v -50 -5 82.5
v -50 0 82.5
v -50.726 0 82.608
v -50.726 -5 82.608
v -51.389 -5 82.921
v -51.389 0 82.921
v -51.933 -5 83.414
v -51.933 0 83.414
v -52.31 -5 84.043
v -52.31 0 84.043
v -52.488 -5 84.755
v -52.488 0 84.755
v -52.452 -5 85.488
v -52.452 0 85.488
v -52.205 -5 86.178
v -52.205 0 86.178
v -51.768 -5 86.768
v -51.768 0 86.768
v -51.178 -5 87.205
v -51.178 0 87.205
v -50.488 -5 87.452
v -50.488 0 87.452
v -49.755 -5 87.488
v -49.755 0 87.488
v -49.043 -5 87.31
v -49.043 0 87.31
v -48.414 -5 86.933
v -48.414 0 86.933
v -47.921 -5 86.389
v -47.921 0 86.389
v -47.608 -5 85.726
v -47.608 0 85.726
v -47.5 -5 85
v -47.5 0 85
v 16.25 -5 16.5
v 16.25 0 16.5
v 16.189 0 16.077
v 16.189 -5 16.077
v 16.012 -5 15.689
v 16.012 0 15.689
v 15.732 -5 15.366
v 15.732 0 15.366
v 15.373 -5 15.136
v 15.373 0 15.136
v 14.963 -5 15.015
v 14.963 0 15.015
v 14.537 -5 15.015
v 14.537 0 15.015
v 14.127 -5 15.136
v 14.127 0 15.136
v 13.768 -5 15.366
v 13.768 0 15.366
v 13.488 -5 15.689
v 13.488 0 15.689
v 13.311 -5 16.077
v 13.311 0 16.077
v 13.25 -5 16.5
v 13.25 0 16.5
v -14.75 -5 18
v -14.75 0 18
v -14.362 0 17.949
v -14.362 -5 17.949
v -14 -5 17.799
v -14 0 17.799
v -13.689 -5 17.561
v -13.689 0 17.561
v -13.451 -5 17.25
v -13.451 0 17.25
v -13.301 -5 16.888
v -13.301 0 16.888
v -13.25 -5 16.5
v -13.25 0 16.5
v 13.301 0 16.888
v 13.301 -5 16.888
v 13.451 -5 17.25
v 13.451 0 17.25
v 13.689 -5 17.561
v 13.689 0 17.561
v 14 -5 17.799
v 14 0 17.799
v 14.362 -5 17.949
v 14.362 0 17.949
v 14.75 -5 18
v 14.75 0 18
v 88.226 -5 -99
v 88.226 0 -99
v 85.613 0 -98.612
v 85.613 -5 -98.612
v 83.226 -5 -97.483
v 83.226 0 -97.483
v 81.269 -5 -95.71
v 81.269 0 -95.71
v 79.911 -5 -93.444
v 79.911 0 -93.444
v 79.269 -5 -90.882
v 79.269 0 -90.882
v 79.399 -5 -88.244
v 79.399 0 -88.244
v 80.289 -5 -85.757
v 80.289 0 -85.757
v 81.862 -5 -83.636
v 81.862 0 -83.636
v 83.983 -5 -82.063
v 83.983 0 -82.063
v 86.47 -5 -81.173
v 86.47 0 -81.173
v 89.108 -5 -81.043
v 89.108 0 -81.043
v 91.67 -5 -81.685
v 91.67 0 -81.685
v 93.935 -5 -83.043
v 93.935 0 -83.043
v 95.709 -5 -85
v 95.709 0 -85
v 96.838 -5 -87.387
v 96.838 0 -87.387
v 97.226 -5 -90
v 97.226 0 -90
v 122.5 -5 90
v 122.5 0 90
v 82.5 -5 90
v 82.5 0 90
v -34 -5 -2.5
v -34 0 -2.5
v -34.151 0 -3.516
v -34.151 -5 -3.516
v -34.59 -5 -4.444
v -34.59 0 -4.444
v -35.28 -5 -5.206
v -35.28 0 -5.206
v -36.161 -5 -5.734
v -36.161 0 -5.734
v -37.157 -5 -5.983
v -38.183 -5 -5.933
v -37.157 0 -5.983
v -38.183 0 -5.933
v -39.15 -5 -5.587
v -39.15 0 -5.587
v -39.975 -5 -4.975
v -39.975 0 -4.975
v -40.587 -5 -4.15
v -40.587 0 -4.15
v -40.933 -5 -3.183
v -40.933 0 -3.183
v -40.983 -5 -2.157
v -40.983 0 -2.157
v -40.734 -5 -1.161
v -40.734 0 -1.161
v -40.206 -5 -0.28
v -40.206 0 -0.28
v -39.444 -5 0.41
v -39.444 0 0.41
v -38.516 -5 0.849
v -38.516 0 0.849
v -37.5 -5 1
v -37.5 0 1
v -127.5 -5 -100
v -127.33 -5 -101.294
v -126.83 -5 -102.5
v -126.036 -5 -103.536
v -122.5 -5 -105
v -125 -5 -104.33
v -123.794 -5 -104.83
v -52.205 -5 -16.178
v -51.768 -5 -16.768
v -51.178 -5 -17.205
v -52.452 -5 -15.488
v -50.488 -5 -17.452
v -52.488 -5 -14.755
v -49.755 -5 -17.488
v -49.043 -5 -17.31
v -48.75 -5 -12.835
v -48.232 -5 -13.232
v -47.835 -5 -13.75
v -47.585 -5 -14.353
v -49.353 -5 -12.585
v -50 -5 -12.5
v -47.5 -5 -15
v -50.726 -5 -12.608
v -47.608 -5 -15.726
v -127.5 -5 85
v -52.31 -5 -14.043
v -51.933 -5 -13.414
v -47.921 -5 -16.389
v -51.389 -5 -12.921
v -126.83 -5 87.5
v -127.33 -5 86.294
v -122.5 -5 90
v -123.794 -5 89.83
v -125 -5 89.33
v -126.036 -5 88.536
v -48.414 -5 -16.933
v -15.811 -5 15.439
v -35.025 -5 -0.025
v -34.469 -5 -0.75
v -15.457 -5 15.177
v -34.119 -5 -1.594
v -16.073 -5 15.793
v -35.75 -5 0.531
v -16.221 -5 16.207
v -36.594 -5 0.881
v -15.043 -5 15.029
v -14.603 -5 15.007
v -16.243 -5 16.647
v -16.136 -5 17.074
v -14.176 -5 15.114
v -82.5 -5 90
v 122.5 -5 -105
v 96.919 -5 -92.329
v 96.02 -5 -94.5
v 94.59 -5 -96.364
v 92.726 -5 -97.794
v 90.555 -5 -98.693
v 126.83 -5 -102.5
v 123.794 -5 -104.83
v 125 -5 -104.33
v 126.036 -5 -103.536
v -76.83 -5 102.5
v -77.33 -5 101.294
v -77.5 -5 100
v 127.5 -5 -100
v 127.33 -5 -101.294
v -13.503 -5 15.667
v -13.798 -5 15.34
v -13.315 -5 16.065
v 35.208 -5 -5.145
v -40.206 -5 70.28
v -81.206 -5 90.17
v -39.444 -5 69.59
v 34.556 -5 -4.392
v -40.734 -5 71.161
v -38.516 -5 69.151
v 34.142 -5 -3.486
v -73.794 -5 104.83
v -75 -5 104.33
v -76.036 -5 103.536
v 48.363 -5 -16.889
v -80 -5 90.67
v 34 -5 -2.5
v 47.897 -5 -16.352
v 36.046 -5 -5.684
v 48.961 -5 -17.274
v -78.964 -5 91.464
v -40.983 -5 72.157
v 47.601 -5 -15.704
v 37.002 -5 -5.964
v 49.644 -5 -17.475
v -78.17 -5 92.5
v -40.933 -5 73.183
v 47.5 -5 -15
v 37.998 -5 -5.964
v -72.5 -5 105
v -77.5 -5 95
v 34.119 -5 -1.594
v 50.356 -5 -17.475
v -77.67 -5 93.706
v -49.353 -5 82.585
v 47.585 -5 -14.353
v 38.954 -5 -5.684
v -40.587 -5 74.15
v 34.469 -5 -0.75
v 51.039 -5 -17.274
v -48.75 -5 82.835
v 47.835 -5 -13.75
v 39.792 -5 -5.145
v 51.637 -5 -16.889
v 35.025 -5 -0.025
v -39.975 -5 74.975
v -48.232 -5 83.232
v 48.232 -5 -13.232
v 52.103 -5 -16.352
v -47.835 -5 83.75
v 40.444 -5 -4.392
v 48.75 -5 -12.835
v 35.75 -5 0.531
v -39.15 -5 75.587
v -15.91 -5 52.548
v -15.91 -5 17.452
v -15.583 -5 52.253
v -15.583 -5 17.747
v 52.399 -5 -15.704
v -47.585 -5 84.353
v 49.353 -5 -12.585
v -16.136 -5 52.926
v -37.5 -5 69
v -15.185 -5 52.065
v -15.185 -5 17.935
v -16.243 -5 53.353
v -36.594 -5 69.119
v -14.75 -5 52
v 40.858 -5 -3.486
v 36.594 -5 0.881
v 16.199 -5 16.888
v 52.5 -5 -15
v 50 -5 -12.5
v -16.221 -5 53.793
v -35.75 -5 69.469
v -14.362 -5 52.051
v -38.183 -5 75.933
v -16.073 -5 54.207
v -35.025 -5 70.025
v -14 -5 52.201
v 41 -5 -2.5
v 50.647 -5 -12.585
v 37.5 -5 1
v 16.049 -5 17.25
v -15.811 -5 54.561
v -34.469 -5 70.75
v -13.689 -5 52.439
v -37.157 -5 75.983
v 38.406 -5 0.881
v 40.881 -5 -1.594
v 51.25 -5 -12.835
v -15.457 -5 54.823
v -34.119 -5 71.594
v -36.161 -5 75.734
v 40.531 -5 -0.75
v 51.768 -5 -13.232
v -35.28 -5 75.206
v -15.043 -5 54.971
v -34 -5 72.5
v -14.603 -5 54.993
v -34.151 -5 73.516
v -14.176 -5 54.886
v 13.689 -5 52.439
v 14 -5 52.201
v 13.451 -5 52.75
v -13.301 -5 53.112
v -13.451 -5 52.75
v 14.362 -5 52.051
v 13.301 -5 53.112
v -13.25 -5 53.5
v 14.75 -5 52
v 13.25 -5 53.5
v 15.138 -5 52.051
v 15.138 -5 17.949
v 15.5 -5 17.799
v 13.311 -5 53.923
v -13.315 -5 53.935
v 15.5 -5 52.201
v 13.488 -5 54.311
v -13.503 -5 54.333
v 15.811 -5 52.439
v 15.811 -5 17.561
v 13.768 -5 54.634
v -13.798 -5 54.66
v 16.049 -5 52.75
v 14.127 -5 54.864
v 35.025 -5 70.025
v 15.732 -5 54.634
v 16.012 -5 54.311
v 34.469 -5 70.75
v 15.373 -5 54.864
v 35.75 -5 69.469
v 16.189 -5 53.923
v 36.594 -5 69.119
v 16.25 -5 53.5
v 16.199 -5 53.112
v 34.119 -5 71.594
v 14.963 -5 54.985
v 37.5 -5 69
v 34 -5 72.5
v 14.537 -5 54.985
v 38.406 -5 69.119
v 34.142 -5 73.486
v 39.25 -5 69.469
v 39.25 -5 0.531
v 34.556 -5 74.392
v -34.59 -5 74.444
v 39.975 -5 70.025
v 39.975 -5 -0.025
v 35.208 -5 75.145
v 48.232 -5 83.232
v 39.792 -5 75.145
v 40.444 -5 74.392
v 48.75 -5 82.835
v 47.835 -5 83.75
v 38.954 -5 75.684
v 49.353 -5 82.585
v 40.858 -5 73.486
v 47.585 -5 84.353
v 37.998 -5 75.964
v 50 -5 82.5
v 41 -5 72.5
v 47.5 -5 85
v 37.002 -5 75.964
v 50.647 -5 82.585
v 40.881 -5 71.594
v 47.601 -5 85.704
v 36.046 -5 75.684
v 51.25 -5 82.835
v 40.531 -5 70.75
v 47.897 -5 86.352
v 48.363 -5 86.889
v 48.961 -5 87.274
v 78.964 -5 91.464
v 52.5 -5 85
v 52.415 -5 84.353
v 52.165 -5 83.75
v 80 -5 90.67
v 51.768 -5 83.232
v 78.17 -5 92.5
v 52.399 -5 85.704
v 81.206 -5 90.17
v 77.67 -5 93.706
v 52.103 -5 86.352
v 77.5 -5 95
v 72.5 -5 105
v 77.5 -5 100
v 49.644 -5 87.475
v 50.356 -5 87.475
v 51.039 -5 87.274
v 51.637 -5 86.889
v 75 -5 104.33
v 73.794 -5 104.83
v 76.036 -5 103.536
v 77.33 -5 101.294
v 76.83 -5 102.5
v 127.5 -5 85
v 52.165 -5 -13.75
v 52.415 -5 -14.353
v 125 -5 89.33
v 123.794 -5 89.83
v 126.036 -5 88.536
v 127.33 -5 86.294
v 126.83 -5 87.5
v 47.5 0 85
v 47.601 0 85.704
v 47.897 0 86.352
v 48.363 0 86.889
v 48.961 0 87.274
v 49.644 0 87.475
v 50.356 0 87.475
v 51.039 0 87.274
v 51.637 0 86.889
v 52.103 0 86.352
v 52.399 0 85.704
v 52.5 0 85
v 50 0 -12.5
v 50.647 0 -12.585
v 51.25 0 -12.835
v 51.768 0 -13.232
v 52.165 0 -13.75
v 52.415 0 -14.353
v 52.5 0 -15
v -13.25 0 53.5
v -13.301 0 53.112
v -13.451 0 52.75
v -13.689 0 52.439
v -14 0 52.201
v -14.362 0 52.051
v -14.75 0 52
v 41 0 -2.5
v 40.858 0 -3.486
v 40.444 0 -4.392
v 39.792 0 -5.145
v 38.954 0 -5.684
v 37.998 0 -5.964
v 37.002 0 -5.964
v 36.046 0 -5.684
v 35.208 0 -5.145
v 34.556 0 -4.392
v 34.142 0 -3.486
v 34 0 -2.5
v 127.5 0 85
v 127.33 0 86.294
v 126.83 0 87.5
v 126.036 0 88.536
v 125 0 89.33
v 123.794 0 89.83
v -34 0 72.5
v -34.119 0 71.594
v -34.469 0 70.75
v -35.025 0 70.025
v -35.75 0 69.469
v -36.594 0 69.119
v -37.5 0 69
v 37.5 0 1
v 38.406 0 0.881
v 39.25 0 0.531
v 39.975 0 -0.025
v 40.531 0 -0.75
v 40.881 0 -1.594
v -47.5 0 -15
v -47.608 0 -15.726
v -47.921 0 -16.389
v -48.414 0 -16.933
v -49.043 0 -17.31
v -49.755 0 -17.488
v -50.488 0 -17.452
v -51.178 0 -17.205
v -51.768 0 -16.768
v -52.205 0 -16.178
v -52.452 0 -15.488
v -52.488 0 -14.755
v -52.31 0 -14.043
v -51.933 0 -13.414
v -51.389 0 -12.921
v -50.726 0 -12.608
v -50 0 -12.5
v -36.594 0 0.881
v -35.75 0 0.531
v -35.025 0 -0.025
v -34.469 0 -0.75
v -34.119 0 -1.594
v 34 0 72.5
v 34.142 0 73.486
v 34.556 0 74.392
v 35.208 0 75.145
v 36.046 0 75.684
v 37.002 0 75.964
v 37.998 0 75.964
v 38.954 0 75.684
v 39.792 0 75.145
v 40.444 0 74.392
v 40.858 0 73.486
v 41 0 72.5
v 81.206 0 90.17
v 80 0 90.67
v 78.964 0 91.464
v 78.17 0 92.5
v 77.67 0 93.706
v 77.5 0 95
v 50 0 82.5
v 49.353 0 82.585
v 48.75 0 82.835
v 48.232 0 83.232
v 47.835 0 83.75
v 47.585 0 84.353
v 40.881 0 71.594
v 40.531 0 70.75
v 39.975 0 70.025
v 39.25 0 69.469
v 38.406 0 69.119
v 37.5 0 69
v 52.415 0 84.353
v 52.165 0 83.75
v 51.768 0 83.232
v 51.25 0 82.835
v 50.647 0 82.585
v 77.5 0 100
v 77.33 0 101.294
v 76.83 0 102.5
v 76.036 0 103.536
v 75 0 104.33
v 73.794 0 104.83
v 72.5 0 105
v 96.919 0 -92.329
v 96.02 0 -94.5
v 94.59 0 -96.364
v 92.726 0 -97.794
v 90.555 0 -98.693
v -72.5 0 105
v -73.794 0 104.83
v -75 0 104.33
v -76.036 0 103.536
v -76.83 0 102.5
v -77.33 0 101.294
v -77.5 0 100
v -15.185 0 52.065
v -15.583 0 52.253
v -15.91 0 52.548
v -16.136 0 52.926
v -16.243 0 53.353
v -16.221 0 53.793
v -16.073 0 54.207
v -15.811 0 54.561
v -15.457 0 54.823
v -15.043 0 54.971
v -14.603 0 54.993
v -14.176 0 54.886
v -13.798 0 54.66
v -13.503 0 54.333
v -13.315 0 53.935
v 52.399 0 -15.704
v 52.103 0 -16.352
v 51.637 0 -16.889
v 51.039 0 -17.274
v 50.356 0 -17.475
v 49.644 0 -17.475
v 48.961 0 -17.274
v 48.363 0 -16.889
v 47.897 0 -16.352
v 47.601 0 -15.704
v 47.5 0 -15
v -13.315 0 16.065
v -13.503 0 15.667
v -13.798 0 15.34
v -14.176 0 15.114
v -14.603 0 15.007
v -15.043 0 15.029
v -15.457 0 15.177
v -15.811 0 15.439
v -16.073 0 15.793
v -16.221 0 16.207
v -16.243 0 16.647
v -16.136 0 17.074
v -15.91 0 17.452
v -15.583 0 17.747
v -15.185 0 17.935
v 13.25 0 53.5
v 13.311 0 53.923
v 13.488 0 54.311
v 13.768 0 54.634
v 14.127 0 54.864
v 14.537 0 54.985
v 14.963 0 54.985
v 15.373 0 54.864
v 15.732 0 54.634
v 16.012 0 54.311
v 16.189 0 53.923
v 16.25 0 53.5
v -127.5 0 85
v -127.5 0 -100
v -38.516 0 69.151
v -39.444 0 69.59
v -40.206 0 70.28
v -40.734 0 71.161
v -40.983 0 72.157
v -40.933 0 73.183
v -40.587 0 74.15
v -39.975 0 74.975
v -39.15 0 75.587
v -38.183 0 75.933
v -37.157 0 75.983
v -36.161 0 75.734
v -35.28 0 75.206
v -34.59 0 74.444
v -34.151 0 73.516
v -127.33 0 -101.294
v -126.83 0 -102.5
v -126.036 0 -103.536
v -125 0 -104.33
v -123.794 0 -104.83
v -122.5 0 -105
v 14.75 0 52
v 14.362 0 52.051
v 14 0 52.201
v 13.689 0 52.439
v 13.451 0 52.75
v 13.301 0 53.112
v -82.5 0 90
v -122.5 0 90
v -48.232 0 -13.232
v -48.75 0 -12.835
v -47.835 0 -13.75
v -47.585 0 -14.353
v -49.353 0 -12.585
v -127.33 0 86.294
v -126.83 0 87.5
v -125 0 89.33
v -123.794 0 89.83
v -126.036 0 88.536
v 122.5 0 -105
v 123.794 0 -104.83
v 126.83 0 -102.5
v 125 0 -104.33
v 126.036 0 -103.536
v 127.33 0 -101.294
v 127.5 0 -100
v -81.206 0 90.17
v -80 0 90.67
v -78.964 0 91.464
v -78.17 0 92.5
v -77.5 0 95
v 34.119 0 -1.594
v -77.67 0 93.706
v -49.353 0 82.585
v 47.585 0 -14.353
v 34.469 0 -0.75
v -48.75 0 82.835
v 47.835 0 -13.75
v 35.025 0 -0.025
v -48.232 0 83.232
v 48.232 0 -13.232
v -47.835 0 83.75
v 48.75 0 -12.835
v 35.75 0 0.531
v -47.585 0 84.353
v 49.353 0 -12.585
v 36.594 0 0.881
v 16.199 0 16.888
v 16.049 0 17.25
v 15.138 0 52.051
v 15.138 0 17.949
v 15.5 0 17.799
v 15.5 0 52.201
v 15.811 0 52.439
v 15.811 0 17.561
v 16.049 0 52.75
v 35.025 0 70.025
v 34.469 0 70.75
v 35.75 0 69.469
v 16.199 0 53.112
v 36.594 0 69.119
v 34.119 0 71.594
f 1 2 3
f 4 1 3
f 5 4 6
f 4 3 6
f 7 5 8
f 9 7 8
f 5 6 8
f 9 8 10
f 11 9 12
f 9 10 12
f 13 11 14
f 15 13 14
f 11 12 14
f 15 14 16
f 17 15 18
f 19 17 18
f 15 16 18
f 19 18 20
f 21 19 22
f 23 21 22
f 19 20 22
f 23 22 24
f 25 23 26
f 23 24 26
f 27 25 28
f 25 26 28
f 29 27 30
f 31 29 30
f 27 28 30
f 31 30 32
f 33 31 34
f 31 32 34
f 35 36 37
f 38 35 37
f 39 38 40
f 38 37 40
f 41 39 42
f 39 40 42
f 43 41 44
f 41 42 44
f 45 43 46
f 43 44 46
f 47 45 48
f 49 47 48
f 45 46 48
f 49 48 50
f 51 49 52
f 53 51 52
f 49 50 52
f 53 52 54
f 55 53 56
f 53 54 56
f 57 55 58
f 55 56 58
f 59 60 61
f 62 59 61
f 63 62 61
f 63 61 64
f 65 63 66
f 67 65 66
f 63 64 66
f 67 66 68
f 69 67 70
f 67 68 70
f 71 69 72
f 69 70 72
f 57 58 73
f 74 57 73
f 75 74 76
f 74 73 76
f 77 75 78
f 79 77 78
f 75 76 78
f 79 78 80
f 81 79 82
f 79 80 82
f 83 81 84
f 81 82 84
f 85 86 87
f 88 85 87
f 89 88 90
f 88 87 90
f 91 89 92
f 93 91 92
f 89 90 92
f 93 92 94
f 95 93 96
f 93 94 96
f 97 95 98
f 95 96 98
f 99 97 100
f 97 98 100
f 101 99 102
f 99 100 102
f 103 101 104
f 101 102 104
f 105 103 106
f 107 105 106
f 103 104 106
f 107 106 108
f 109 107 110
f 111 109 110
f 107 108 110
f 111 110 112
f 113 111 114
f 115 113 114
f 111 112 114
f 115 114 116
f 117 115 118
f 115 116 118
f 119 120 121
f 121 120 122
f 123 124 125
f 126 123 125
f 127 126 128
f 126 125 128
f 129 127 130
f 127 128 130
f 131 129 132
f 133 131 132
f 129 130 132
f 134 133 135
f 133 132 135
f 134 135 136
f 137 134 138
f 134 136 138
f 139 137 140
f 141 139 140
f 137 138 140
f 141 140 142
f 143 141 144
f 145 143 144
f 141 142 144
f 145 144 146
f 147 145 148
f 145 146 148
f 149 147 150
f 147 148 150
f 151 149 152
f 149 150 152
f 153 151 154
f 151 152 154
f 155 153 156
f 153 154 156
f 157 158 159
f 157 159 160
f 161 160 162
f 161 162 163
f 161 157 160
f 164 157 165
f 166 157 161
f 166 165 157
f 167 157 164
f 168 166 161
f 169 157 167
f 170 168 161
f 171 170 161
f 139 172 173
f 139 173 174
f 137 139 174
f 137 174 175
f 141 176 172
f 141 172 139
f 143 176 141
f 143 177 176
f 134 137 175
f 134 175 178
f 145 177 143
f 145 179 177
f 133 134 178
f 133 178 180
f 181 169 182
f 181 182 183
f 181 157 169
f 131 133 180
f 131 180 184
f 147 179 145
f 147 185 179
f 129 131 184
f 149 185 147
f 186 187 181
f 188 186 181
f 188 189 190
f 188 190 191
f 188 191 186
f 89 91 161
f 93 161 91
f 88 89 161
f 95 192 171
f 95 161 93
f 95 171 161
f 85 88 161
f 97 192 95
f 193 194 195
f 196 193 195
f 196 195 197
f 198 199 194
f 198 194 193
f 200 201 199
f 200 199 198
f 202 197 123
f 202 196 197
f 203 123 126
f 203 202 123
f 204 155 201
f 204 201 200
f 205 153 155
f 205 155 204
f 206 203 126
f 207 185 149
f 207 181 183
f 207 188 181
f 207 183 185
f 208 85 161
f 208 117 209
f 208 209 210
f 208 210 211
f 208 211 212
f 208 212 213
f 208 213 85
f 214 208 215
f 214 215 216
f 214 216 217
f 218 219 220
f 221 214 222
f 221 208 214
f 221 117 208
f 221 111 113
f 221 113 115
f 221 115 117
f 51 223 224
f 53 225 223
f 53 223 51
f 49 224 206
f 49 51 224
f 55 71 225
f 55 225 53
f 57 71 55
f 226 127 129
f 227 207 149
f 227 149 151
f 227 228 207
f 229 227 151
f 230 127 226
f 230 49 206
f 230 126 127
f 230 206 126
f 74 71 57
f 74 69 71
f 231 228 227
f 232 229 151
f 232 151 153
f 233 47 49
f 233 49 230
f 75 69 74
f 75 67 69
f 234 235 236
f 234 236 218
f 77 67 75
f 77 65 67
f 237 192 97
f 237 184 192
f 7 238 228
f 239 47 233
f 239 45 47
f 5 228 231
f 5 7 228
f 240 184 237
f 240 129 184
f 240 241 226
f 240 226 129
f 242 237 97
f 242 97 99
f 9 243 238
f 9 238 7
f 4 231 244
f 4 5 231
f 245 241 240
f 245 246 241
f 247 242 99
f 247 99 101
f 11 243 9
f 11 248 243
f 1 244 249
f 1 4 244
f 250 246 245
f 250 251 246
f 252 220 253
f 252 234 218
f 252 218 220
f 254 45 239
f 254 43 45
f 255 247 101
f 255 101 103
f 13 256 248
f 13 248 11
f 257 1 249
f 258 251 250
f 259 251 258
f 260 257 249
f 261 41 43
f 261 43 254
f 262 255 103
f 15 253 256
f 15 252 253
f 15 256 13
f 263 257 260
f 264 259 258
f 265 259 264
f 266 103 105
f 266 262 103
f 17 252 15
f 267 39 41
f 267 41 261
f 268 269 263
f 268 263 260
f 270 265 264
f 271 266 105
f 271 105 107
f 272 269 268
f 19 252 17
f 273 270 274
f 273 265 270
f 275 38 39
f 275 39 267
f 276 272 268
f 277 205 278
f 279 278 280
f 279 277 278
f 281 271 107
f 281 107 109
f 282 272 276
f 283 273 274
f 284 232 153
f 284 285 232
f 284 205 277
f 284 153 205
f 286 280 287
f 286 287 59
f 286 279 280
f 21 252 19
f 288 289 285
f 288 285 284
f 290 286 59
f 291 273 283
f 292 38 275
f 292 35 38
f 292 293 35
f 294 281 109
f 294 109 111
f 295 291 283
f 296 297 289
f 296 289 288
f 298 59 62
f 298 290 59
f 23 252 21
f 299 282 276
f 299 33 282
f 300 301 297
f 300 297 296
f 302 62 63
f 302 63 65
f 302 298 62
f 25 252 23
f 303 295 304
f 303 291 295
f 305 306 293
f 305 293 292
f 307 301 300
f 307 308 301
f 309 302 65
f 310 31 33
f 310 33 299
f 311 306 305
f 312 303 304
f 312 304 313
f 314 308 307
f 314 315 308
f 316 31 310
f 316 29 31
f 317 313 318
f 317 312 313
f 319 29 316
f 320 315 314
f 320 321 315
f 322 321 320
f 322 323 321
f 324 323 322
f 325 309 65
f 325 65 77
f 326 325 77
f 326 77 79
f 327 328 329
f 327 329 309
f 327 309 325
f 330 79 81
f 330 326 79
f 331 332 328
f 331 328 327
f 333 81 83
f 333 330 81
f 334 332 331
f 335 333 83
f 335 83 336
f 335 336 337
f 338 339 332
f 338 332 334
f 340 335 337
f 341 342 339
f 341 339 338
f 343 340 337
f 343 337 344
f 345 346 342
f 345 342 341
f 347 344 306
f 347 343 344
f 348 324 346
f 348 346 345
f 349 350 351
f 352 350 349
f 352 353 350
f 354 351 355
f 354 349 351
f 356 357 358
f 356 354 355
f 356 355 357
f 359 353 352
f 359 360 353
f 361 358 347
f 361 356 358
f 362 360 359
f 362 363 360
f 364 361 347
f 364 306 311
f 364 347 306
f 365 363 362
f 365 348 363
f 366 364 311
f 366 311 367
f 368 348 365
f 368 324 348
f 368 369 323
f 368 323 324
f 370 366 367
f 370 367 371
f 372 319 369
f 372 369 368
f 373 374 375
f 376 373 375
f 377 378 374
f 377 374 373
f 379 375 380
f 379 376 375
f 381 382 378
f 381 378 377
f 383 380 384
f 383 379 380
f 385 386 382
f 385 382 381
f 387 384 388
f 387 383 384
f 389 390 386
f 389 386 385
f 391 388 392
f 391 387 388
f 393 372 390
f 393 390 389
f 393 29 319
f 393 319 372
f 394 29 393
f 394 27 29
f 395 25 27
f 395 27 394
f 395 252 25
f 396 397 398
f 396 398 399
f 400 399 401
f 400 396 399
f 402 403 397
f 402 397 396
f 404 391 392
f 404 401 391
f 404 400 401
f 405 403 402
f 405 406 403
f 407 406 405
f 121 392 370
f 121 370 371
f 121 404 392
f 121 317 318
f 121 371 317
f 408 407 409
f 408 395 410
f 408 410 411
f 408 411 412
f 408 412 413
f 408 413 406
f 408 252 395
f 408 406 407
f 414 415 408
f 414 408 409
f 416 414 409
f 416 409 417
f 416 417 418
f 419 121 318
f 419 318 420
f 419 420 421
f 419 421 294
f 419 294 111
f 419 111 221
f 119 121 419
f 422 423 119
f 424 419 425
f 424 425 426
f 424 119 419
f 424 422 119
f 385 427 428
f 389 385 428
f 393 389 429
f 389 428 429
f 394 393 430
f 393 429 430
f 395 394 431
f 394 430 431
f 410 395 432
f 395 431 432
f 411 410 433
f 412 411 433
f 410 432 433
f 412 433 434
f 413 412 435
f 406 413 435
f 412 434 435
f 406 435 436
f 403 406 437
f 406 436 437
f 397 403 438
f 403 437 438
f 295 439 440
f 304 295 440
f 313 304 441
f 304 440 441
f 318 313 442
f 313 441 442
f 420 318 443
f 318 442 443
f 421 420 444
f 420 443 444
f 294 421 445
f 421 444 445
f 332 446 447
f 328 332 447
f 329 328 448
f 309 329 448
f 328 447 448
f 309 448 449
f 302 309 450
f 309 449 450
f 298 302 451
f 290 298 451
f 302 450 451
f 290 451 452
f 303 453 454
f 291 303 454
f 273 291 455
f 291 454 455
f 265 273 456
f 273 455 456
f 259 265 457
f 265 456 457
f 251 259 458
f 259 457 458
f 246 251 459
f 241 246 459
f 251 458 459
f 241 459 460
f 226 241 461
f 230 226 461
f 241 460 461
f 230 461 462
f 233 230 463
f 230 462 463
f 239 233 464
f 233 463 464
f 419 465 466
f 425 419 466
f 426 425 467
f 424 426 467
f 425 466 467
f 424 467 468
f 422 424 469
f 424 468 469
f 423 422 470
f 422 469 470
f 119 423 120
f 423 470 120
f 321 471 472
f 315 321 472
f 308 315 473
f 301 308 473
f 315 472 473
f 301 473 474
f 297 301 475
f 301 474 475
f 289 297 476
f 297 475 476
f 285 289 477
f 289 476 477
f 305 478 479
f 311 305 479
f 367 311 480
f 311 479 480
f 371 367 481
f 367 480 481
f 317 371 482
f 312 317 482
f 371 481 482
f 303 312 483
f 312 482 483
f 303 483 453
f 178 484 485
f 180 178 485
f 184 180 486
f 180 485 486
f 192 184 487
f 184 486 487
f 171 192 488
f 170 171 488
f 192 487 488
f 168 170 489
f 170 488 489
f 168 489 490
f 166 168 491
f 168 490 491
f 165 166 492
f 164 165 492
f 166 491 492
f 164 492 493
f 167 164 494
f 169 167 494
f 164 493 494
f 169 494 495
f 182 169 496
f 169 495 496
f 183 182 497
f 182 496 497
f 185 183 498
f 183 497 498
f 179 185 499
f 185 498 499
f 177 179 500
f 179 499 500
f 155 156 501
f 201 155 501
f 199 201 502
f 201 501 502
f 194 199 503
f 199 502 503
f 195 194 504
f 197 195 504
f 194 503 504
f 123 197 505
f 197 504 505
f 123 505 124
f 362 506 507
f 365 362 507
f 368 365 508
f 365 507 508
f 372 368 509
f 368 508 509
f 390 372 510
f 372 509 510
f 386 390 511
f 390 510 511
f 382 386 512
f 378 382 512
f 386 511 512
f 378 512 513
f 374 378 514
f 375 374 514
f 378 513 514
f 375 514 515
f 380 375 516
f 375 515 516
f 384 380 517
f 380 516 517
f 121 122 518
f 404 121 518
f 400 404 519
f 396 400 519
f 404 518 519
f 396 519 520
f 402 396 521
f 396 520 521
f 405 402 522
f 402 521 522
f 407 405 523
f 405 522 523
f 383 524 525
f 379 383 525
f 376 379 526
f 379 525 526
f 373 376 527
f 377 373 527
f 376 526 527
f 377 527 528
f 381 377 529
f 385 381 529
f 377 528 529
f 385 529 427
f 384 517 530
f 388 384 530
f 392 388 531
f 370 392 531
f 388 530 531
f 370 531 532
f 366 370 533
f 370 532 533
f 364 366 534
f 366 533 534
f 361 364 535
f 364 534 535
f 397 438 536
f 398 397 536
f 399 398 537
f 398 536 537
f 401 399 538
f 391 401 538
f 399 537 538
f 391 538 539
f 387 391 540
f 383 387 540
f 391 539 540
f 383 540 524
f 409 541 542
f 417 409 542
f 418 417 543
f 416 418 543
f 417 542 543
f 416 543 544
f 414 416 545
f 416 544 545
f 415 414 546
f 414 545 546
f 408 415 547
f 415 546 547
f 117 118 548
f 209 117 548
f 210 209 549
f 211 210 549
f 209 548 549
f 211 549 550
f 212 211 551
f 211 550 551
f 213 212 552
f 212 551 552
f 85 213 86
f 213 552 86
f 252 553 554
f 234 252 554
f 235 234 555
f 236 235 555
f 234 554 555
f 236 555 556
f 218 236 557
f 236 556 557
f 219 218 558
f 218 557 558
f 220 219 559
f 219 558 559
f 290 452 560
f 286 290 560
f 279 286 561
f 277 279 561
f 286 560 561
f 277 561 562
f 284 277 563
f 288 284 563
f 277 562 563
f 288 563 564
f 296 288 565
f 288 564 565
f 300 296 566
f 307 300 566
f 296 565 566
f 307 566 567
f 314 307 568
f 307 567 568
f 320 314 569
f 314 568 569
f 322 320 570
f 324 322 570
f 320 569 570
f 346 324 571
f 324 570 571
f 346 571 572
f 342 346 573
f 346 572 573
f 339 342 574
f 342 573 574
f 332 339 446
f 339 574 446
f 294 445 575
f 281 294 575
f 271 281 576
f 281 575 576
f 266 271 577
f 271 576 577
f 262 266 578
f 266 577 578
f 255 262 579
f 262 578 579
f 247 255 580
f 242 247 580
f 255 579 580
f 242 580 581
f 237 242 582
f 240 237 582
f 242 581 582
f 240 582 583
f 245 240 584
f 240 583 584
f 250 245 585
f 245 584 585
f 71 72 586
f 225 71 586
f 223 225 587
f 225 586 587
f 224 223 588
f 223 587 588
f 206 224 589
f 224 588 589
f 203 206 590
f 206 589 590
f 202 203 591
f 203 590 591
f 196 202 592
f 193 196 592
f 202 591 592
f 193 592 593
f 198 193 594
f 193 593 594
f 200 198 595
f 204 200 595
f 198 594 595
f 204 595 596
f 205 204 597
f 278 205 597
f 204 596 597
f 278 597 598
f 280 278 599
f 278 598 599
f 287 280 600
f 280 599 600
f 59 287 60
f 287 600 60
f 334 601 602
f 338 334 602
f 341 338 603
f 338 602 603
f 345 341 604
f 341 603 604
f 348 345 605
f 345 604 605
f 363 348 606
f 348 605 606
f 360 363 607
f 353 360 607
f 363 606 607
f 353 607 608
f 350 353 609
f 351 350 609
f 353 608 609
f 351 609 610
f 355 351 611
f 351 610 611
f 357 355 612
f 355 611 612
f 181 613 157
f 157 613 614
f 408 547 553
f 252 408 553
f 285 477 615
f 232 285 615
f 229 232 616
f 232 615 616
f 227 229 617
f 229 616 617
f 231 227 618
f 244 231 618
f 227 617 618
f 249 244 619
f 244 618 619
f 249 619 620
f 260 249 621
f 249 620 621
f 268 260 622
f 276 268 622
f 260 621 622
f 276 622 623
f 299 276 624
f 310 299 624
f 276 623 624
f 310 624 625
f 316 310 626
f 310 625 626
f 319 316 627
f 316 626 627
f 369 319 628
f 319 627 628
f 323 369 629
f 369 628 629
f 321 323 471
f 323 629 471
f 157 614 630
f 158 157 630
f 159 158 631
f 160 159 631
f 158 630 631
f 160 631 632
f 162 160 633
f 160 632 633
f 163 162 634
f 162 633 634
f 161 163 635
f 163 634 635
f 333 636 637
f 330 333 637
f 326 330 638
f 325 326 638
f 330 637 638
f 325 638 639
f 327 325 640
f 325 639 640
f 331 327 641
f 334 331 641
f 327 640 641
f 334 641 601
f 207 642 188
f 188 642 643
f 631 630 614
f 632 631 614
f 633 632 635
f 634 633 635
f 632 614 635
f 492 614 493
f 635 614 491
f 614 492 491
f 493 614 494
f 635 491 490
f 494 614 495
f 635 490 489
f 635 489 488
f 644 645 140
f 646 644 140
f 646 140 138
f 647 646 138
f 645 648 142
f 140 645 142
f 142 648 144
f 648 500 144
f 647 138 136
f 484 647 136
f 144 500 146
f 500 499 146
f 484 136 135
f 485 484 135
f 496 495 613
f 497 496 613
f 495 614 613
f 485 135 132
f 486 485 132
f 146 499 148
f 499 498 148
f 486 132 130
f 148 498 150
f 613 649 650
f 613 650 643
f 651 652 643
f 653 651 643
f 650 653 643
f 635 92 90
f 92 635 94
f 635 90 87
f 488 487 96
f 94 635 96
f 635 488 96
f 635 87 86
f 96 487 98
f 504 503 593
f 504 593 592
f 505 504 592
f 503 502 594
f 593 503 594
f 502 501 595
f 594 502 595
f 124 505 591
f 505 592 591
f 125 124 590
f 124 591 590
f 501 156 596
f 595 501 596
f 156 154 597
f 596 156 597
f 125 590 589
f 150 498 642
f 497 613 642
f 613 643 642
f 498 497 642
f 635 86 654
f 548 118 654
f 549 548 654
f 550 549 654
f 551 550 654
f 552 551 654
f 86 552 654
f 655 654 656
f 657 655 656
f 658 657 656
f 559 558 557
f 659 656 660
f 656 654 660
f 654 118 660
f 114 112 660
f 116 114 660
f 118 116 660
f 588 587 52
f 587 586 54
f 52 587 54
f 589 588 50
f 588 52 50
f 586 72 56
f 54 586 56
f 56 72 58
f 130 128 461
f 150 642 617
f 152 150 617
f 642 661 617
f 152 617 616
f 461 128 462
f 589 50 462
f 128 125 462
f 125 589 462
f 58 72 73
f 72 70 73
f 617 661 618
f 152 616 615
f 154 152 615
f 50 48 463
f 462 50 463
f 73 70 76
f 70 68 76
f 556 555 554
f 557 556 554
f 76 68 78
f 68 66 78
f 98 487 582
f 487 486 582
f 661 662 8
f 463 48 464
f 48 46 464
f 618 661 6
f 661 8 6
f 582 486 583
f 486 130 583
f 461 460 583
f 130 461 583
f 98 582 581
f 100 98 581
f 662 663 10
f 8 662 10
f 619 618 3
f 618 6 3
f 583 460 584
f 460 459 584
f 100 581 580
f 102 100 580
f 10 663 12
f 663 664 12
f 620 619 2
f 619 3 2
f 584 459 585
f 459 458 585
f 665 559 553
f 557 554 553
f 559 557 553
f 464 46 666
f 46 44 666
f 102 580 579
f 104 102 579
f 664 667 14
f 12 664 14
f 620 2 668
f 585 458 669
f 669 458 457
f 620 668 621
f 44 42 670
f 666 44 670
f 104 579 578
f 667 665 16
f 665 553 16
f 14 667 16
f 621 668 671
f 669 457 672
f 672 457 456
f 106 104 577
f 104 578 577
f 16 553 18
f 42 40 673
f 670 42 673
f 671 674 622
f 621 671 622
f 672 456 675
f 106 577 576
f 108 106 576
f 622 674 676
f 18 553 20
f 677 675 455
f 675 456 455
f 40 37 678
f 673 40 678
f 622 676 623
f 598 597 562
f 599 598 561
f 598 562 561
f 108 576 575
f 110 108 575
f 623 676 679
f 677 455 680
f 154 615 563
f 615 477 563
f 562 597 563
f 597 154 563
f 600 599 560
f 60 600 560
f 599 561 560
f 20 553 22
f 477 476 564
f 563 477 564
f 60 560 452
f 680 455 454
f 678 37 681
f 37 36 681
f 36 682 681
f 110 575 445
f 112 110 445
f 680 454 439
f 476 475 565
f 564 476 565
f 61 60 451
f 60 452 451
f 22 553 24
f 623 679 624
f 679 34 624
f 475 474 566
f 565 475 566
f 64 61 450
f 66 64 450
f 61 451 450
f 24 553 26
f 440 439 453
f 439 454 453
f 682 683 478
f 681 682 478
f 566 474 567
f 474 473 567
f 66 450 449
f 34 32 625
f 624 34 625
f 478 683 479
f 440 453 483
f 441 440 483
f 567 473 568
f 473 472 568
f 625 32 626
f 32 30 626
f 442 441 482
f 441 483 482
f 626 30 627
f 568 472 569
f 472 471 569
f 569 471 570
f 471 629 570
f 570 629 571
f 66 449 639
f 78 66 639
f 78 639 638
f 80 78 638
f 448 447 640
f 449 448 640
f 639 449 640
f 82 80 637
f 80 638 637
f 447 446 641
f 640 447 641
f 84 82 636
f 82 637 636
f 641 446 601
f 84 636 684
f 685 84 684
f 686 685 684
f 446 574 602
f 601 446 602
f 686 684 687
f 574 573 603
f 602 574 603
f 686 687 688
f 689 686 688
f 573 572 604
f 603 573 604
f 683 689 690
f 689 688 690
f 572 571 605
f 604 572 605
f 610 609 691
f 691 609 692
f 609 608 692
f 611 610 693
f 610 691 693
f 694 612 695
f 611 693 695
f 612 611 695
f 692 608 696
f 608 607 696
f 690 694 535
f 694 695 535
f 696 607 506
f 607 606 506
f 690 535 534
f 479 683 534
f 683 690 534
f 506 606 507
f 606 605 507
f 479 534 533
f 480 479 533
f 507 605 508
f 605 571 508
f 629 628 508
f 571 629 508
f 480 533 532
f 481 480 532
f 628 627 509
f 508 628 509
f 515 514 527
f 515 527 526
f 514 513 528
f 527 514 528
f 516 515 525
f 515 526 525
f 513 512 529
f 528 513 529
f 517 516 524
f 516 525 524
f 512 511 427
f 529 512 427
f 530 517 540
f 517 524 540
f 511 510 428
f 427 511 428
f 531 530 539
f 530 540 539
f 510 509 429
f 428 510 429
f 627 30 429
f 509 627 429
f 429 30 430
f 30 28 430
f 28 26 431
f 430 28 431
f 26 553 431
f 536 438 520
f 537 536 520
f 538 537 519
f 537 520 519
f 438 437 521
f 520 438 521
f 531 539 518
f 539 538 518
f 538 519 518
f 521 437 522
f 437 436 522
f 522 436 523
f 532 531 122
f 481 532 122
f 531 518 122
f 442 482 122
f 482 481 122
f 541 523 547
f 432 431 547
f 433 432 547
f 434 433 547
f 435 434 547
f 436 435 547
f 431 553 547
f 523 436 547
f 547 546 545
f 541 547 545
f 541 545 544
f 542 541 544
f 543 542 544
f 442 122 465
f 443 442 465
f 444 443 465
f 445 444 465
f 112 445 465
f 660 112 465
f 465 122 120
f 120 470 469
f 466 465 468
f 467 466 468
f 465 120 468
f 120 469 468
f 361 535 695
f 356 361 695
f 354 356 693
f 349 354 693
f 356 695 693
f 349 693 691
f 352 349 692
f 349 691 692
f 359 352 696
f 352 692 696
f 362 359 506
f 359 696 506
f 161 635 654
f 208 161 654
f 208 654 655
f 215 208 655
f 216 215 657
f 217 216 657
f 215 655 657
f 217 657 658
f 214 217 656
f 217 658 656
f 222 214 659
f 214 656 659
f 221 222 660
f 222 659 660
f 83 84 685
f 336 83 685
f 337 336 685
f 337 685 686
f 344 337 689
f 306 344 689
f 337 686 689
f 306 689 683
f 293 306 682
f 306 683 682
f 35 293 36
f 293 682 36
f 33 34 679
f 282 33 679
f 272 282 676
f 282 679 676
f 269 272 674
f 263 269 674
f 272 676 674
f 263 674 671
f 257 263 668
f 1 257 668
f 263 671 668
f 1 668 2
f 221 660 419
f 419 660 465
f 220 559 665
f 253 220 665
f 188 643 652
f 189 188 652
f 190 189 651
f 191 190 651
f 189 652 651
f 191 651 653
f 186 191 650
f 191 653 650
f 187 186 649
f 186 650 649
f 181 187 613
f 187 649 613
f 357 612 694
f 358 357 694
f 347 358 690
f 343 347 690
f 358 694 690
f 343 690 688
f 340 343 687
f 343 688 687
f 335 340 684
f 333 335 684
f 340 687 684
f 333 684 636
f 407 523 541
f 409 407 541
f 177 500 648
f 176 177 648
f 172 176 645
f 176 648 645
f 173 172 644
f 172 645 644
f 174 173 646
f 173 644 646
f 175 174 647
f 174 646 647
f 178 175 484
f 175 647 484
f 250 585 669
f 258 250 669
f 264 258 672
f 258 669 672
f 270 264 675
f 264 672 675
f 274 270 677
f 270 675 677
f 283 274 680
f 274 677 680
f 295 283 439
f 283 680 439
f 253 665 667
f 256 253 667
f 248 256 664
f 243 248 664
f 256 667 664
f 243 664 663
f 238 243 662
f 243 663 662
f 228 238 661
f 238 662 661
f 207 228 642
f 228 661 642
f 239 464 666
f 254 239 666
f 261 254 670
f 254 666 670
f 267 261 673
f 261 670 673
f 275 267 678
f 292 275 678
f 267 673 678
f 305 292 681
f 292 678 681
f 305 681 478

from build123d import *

# Parameters (mm, degrees)
F1_DEPTH = 5


with BuildPart() as f1:
    # F0 (on Front) → F1 (new body)
    with BuildSketch(Plane.XZ):
        with BuildLine():
            Line((88.225863874, -105), (122.5, -105))
            ThreePointArc((122.5, -105), (126.0355339059, -103.5355339059), (127.5, -100))
            Line((127.5, -100), (127.5, 85))
            ThreePointArc((127.5, 85), (126.0355339059, 88.5355339059), (122.5, 90))
            Line((122.5, 90), (82.5, 90))
            ThreePointArc((82.5, 90), (78.9644660941, 91.4644660941), (77.5, 95))
            Line((77.5, 95), (77.5, 100))
            ThreePointArc((77.5, 100), (76.0355339059, 103.5355339059), (72.5, 105))
            Line((72.5, 105), (0, 105))
            Line((0, 105), (-72.5, 105))
            ThreePointArc((-72.5, 105), (-76.0355339059, 103.5355339059), (-77.5, 100))
            Line((-77.5, 100), (-77.5, 95))
            ThreePointArc((-77.5, 95), (-78.9644660941, 91.4644660941), (-82.5, 90))
            Line((-82.5, 90), (-122.5, 90))
            ThreePointArc((-122.5, 90), (-126.0355339059, 88.5355339059), (-127.5, 85))
            Line((-127.5, 85), (-127.5, -100))
            ThreePointArc((-127.5, -100), (-126.0355339059, -103.5355339059), (-122.5, -105))
            Line((-122.5, -105), (88.225863874, -105))
        make_face()
        with BuildLine():
            ThreePointArc((97.225863874, -90), (94.5898249046, -96.3639610307), (88.225863874, -99))
            ThreePointArc((88.225863874, -99), (81.8619028433, -83.6360389693), (97.225863874, -90))
        make_face(mode=Mode.SUBTRACT)
        with BuildLine():
            Line((-47.5, 85), (0, 85))
            Line((0, 85), (47.5, 85))
            ThreePointArc((47.5, 85), (50, 87.5), (52.5, 85))
            ThreePointArc((52.5, 85), (51.767766953, 83.232233047), (50, 82.5))
            Line((50, 82.5), (50, -12.5))
            ThreePointArc((50, -12.5), (51.767766953, -13.232233047), (52.5, -15))
            ThreePointArc((52.5, -15), (50, -17.5), (47.5, -15))
            Line((47.5, -15), (-47.5, -15))
            ThreePointArc((-47.5, -15), (-51.767766953, -16.767766953), (-50, -12.5))
            Line((-50, -12.5), (-50, 82.5))
            ThreePointArc((-50, 82.5), (-51.767766953, 86.767766953), (-47.5, 85))
        make_face(mode=Mode.SUBTRACT)
        with BuildLine():
            Line((47.5, 85), (0, 85))
            Line((0, 85), (-47.5, 85))
            ThreePointArc((-47.5, 85), (-48.232233047, 83.232233047), (-50, 82.5))
            Line((-50, 82.5), (-50, -12.5))
            ThreePointArc((-50, -12.5), (-48.232233047, -13.232233047), (-47.5, -15))
            Line((-47.5, -15), (47.5, -15))
            ThreePointArc((47.5, -15), (48.232233047, -13.232233047), (50, -12.5))
            Line((50, -12.5), (50, 82.5))
            ThreePointArc((50, 82.5), (48.232233047, 83.232233047), (47.5, 85))
        make_face()
        with BuildLine():
            Line((34, -2.5), (-34, -2.5))
            ThreePointArc((-34, -2.5), (-39.9748737342, -4.9748737342), (-37.5, 1))
            Line((-37.5, 1), (-37.5, 69))
            ThreePointArc((-37.5, 69), (-39.9748737342, 74.9748737342), (-34, 72.5))
            Line((-34, 72.5), (34, 72.5))
            ThreePointArc((34, 72.5), (37.5, 76), (41, 72.5))
            ThreePointArc((41, 72.5), (39.9748737342, 70.0251262658), (37.5, 69))
            Line((37.5, 69), (37.5, 1))
            ThreePointArc((37.5, 1), (39.9748737342, -0.0251262658), (41, -2.5))
            ThreePointArc((41, -2.5), (37.5, -6), (34, -2.5))
        make_face(mode=Mode.SUBTRACT)
        with BuildLine():
            ThreePointArc((-37.5, 1), (-35.0251262658, -0.0251262658), (-34, -2.5))
            Line((-34, -2.5), (34, -2.5))
            ThreePointArc((34, -2.5), (35.0251262658, -0.0251262658), (37.5, 1))
            Line((37.5, 1), (37.5, 69))
            ThreePointArc((37.5, 69), (35.0251262658, 70.0251262658), (34, 72.5))
            Line((34, 72.5), (-34, 72.5))
            ThreePointArc((-34, 72.5), (-35.0251262658, 70.0251262658), (-37.5, 69))
            Line((-37.5, 69), (-37.5, 1))
        make_face()
        with BuildLine():
            Line((13.25, 16.5), (-13.25, 16.5))
            ThreePointArc((-13.25, 16.5), (-15.8106601718, 15.4393398282), (-14.75, 18))
            Line((-14.75, 18), (-14.75, 52))
            ThreePointArc((-14.75, 52), (-15.8106601718, 54.5606601718), (-13.25, 53.5))
            Line((-13.25, 53.5), (13.25, 53.5))
            ThreePointArc((13.25, 53.5), (14.75, 55), (16.25, 53.5))
            ThreePointArc((16.25, 53.5), (15.8106601718, 52.4393398282), (14.75, 52))
            Line((14.75, 52), (14.75, 18))
            ThreePointArc((14.75, 18), (15.8106601718, 17.5606601718), (16.25, 16.5))
            ThreePointArc((16.25, 16.5), (14.75, 15), (13.25, 16.5))
        make_face(mode=Mode.SUBTRACT)
        with BuildLine():
            ThreePointArc((-14.75, 18), (-13.6893398282, 17.5606601718), (-13.25, 16.5))
            Line((-13.25, 16.5), (13.25, 16.5))
            ThreePointArc((13.25, 16.5), (13.6893398282, 17.5606601718), (14.75, 18))
            Line((14.75, 18), (14.75, 52))
            ThreePointArc((14.75, 52), (13.6893398282, 52.4393398282), (13.25, 53.5))
            Line((13.25, 53.5), (-13.25, 53.5))
            ThreePointArc((-13.25, 53.5), (-13.6893398282, 52.4393398282), (-14.75, 52))
            Line((-14.75, 52), (-14.75, 18))
        make_face()
    extrude(amount=F1_DEPTH)


solid = f1.part
